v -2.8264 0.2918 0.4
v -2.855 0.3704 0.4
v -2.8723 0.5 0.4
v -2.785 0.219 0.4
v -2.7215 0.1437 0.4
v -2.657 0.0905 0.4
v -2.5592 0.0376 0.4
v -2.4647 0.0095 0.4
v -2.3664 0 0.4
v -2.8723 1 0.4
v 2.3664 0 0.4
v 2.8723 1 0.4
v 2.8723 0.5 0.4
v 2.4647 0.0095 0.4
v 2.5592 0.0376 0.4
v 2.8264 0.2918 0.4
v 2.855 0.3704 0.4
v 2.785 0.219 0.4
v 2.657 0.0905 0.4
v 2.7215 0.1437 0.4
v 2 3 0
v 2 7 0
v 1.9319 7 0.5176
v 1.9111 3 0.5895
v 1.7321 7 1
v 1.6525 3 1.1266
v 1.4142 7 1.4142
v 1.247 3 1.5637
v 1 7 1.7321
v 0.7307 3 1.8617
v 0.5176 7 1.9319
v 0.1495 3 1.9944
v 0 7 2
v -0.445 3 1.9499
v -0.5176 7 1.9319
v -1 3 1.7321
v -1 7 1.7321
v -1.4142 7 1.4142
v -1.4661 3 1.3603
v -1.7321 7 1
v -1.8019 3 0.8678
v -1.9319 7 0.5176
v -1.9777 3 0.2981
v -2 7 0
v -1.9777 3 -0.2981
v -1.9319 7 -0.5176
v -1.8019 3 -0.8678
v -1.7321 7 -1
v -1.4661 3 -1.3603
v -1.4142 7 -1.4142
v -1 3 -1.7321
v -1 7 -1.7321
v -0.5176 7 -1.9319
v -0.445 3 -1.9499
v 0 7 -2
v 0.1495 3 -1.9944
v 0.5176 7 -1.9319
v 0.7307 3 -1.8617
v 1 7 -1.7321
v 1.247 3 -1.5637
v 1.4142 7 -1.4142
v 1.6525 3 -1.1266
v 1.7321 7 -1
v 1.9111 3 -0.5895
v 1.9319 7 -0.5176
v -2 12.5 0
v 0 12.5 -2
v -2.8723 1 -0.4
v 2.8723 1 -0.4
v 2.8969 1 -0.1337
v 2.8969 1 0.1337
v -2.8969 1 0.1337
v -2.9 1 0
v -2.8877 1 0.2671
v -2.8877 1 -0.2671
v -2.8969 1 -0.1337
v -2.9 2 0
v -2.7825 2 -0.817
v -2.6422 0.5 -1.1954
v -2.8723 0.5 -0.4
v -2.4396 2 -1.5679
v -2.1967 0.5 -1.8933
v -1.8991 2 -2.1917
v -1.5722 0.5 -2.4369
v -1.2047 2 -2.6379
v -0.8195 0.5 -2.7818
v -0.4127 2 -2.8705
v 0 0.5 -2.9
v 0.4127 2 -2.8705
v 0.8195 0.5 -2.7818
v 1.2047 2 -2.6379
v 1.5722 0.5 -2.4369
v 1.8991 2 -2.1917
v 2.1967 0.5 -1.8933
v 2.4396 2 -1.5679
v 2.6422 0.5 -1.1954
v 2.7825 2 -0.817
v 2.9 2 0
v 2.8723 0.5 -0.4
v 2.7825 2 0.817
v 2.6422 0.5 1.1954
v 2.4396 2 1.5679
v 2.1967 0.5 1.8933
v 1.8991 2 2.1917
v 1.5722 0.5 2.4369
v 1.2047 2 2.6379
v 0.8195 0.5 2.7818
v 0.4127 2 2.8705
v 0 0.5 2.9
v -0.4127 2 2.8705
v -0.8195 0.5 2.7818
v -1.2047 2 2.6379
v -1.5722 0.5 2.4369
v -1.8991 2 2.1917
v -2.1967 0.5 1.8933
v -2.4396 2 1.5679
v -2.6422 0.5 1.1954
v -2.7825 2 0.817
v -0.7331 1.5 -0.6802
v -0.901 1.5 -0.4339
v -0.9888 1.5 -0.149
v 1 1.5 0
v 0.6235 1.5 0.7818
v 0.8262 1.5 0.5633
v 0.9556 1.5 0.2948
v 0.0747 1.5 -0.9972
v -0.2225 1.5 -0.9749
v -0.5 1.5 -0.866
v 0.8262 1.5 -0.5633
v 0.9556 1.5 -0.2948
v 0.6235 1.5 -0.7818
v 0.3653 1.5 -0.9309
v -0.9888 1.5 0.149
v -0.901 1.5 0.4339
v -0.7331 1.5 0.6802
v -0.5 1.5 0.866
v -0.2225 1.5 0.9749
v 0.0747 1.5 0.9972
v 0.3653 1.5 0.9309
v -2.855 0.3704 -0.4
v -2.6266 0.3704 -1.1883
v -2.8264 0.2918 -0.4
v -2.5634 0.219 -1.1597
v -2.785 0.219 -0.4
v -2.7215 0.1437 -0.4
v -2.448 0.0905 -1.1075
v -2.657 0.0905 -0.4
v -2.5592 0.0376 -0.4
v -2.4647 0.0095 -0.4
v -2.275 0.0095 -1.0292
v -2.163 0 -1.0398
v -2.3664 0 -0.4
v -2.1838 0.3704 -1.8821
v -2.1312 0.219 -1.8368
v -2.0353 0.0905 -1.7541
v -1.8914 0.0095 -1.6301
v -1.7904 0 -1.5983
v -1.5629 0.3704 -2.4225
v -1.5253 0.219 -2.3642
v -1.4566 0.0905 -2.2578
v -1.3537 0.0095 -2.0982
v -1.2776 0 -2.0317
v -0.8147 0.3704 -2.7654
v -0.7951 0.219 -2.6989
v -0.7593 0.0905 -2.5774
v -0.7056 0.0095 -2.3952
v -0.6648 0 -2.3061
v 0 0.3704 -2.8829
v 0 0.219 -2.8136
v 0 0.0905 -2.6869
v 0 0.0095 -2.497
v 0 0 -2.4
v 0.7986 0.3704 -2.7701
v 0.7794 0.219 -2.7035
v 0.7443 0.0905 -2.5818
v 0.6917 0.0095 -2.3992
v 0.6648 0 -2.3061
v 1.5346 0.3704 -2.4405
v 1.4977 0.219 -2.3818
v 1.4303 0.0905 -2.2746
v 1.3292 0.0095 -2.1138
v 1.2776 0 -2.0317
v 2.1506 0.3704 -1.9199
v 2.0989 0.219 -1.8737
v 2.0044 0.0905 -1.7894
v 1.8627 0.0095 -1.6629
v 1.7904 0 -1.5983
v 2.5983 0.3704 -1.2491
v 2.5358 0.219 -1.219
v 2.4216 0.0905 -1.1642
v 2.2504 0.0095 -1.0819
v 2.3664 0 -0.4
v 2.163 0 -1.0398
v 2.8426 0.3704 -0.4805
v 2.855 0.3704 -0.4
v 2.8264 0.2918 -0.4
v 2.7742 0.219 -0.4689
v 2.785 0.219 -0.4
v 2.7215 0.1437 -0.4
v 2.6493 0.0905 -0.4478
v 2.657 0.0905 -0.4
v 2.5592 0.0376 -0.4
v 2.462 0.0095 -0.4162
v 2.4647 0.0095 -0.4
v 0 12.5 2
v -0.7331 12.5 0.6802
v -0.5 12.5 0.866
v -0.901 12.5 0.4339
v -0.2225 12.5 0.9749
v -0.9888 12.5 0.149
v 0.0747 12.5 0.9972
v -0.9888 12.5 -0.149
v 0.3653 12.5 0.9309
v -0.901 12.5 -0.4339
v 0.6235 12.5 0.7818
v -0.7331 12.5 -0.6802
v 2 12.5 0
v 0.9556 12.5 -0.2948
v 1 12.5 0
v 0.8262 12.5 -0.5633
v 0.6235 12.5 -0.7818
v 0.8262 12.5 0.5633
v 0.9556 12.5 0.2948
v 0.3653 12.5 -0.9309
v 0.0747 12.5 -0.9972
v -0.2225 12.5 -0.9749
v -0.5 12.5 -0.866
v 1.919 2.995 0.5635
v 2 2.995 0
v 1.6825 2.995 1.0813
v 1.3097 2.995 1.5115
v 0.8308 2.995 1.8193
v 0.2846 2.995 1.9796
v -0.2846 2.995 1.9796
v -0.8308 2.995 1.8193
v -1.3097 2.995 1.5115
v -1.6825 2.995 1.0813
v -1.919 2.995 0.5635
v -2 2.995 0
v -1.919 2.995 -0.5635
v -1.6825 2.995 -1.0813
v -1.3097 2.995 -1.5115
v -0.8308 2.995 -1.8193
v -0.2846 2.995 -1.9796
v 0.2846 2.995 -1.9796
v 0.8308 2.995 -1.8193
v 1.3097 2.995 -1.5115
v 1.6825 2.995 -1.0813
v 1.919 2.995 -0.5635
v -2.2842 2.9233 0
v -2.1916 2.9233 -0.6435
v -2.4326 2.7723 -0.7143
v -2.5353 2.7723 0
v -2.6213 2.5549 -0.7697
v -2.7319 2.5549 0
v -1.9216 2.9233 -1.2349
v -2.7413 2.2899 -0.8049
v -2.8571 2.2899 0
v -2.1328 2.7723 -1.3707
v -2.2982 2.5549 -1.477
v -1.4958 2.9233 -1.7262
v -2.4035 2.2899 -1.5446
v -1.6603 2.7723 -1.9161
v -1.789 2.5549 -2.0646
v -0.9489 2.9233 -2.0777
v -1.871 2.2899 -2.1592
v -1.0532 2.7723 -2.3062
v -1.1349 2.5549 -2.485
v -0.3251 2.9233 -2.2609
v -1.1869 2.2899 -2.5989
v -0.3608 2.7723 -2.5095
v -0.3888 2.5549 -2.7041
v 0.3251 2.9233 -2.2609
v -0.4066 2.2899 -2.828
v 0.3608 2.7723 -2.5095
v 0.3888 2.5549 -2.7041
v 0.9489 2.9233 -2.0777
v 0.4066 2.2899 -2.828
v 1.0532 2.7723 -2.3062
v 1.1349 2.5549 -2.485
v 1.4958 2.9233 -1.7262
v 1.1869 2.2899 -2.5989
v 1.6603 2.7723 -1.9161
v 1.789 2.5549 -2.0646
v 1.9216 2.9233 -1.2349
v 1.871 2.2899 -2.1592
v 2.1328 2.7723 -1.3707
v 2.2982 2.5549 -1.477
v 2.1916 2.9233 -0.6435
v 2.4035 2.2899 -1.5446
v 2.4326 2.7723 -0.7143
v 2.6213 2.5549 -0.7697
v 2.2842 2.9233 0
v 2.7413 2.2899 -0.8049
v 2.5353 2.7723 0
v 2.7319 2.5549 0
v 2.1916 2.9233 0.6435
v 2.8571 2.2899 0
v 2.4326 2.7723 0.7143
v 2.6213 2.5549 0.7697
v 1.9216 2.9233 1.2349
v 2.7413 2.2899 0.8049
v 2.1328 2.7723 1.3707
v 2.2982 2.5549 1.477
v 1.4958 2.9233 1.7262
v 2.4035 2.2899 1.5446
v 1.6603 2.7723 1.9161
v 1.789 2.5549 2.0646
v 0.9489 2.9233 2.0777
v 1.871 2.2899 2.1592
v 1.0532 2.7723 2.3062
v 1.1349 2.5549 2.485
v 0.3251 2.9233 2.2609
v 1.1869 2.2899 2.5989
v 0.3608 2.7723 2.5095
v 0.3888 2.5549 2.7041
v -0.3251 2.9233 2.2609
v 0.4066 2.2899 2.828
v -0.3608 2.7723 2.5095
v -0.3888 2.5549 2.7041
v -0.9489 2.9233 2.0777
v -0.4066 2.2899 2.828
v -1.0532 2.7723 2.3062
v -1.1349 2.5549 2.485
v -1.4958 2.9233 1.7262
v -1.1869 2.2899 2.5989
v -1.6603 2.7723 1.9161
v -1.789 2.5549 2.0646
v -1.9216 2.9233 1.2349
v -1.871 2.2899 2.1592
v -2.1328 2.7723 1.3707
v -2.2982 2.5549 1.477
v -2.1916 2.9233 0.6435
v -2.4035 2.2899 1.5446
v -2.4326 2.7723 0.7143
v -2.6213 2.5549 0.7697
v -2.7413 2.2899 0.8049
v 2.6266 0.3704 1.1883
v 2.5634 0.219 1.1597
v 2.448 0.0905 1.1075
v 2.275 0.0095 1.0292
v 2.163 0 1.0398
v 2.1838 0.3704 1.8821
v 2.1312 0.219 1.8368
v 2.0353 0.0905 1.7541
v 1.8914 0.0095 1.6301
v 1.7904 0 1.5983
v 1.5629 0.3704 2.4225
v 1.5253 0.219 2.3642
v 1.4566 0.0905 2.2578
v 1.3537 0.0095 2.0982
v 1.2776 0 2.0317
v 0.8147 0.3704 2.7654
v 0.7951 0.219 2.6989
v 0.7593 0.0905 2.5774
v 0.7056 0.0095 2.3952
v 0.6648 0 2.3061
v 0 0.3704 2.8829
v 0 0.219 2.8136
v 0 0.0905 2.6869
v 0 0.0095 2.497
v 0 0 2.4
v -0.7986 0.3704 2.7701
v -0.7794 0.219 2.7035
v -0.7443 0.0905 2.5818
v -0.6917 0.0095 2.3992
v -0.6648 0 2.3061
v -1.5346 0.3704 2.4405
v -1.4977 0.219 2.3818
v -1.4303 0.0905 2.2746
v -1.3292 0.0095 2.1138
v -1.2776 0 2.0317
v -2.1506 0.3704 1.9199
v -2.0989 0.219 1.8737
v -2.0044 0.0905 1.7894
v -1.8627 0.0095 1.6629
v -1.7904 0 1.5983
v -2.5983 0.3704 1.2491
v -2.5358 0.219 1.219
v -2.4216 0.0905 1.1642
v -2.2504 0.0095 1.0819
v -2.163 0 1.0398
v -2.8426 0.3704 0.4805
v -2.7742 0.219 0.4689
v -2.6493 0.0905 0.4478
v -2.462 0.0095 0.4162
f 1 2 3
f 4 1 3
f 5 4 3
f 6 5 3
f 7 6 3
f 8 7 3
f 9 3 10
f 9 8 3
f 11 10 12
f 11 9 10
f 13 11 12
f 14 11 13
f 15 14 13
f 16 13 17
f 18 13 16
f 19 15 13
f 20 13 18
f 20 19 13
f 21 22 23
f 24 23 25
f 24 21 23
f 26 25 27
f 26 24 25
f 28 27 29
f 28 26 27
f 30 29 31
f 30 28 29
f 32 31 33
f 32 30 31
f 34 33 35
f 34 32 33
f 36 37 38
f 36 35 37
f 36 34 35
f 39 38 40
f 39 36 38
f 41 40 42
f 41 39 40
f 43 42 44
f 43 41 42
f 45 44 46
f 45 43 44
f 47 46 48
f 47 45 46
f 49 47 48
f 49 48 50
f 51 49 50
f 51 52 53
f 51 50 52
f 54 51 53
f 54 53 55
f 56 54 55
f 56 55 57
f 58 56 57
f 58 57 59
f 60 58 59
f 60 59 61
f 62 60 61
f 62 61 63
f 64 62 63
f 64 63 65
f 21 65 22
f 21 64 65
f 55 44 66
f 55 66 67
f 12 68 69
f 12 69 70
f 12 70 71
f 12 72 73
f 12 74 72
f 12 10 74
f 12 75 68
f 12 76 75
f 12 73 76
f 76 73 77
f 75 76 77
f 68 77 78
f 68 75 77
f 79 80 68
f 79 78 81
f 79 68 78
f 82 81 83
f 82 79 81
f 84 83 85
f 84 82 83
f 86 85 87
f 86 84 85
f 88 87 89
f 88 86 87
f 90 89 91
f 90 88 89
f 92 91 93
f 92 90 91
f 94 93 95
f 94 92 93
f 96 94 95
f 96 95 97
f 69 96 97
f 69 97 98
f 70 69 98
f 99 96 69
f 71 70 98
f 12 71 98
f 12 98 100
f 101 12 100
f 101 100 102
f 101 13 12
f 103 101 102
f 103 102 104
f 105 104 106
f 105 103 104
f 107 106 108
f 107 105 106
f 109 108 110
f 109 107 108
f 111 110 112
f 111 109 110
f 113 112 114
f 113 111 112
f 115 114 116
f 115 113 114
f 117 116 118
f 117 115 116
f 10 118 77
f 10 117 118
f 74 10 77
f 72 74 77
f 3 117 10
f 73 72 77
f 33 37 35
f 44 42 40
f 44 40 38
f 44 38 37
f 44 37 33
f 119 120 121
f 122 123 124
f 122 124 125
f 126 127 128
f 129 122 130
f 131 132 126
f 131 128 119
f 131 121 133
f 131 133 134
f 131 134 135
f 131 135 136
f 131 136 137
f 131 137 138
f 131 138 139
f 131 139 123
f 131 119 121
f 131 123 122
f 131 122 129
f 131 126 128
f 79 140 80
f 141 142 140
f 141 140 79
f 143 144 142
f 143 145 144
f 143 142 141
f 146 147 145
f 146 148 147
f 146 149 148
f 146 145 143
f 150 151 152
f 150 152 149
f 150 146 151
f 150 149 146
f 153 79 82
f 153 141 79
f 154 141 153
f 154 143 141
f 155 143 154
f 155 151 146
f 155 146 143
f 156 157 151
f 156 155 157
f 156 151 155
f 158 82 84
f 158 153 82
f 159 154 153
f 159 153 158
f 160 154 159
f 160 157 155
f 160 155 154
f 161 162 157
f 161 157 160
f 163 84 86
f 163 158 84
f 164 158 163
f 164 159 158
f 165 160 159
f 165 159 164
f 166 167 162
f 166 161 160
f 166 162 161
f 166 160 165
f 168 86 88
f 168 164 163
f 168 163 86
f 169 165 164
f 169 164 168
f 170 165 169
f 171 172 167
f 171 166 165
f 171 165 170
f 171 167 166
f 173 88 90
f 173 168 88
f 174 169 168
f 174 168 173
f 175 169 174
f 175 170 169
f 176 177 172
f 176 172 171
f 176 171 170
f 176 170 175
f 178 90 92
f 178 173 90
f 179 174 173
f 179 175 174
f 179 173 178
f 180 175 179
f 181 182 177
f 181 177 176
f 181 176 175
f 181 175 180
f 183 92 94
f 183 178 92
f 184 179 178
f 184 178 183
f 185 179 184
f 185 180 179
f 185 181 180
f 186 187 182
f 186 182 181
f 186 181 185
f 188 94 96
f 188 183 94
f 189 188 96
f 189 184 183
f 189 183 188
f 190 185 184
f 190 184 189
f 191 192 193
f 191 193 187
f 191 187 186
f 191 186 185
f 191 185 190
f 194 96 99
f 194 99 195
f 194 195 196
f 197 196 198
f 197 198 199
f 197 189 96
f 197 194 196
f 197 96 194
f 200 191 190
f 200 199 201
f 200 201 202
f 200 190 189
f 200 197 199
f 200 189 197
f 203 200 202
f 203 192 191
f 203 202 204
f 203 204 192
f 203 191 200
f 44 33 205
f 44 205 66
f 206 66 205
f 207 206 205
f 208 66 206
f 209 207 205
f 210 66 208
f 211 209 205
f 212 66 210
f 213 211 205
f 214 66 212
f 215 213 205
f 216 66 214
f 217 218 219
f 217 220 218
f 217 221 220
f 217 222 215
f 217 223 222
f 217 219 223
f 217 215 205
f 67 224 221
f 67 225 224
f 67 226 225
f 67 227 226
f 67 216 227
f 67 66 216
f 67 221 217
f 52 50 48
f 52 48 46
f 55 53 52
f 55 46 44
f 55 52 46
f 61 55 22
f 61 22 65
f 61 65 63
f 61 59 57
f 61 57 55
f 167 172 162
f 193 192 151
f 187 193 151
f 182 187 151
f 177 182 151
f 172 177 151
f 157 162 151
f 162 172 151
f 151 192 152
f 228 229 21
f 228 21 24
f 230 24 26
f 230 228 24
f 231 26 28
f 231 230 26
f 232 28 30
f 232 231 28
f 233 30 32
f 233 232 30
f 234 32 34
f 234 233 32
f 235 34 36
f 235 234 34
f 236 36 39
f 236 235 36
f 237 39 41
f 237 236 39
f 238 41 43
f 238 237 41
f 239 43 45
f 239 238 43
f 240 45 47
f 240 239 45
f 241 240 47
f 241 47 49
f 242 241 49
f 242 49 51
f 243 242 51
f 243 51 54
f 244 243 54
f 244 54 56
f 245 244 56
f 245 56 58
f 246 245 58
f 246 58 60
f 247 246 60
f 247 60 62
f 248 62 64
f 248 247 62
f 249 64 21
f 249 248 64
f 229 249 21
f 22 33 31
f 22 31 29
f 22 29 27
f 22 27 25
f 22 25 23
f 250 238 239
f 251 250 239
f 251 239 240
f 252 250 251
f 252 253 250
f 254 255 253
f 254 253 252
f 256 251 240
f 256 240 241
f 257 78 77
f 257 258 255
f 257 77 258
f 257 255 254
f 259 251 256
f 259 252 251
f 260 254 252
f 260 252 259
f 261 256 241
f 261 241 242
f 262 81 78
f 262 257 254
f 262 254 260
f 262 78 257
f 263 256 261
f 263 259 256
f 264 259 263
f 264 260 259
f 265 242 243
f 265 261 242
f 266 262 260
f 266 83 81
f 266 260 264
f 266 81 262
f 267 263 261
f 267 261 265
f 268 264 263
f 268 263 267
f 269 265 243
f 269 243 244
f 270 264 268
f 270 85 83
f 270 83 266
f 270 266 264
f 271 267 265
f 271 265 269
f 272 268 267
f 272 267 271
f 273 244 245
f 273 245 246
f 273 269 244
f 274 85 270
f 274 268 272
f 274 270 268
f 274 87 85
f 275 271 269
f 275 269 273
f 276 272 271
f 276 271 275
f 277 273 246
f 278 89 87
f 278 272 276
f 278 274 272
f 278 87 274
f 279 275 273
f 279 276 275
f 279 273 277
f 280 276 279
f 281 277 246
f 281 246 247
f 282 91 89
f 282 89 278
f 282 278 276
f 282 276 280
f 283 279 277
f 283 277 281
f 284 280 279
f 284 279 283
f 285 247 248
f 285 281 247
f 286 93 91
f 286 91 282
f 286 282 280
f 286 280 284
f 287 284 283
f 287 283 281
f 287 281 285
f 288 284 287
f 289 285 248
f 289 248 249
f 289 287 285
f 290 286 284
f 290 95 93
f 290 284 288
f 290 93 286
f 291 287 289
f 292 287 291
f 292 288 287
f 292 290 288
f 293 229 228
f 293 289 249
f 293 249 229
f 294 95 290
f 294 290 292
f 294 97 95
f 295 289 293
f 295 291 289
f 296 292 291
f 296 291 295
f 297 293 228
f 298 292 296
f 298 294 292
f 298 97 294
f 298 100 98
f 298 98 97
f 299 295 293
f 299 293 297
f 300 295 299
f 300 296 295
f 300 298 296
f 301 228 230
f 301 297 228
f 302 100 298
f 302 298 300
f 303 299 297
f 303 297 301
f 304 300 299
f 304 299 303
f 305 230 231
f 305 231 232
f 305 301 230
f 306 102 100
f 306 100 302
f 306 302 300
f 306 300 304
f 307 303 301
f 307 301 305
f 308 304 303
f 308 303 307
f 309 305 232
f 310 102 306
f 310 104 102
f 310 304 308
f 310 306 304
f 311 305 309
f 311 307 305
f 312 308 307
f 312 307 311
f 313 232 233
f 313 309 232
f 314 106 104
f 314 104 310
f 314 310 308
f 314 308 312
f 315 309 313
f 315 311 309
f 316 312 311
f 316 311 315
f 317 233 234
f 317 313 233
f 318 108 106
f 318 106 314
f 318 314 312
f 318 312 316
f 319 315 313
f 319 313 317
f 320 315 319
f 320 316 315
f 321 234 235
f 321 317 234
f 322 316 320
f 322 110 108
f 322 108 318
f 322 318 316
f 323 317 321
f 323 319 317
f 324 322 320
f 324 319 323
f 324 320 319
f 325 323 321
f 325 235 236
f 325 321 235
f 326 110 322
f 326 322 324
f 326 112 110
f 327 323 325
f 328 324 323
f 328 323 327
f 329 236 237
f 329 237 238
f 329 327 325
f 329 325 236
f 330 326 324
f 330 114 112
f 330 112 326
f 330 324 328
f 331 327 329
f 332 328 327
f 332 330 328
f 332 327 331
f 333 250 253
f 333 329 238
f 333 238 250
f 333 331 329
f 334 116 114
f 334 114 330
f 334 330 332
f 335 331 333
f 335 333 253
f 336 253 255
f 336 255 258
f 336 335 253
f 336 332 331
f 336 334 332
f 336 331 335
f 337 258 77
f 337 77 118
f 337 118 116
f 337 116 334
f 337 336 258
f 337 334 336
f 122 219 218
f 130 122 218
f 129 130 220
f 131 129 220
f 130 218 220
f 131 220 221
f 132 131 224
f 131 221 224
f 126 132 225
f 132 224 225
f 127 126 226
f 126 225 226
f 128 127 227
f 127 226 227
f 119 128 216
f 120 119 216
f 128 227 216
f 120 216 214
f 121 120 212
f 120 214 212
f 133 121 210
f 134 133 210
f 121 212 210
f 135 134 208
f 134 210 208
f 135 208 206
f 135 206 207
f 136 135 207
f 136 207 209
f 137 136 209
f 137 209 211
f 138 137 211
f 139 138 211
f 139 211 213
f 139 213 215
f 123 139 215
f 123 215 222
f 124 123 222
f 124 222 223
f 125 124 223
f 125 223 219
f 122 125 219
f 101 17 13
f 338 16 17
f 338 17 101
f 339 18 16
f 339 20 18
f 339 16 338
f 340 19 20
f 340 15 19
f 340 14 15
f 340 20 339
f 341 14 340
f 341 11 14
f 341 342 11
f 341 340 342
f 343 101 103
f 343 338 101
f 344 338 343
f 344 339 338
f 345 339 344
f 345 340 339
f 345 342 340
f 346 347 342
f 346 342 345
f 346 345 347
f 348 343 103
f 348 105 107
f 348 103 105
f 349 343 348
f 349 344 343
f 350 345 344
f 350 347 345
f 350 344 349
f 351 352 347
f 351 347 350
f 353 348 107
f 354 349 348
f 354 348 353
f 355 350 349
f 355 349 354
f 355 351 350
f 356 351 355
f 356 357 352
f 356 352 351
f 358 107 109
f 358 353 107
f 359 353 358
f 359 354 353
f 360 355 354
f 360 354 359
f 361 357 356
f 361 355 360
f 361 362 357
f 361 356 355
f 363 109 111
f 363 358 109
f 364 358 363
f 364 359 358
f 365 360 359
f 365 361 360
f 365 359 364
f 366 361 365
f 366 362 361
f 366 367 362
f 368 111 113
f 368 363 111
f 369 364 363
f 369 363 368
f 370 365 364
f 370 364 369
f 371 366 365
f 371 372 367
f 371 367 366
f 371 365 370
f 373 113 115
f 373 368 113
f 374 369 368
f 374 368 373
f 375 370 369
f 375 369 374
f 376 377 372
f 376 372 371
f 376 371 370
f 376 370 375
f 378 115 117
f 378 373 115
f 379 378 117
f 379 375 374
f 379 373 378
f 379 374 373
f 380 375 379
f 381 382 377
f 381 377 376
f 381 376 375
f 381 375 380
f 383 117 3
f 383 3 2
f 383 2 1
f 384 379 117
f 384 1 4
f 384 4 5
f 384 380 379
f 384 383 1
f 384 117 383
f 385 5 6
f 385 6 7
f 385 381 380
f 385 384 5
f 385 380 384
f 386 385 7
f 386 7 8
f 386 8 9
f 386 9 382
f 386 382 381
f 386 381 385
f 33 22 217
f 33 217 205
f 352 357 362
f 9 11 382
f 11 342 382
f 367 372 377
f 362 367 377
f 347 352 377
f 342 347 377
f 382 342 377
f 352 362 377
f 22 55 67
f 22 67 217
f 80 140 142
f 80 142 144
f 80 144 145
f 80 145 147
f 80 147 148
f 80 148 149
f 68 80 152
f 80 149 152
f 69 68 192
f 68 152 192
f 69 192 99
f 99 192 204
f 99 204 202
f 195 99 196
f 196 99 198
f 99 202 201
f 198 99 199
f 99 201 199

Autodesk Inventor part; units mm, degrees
ref_plane "YZ Plane" through (0, 0, 0) normal (1, 0, 0) x (0, 1, 0)
ref_plane "XZ Plane" through (0, 0, 0) normal (0, 1, 0) x (-1, 0, 0)
ref_plane "XY Plane" through (0, 0, 0) normal (0, 0, 1) x (1, 0, 0)
sketch "Sketch1" plane through (0, 0, 0) normal (0, 1, 0) x (-1, 0, 0)
  circle A0 centre (0, 0) radius 2.9
  dimension "d0" = 5.8
extrude "Extrusion1" add sketch "Sketch1" along normal blind 3
sketch "Sketch2" plane through (0, 3, 0) normal (0, 1, 0) x (1, 0, 0)
  circle A0 centre (0, 0) radius 2
  dimension "d3" = 4
extrude "Extrusion2" add sketch "Sketch2" along normal blind 4
sketch "Sketch3" plane through (0, 7, 0) normal (0, 1, 0) x (1, 0, 0)
  circle A0 centre (0, 0) radius 2 projected
  line L0 (0, -2) -> (-2, 0)
  line L1 (-2, 0) -> (0, 2)
  line L2 (0, 2) -> (2, 0)
  line L3 (2, 0) -> (0, -2)
extrude "Extrusion3" add sketch "Sketch3" along normal blind 5.5 contours L3 L0 L1 L2
fillet "Fillet1" radius 1 1 edges at (2.9, 3, 0)
fillet "Fillet2" radius 0.5 1 edges at (2.9, 0, 0)
sketch "Sketch4" plane through (0, 0, 0) normal (0, -1, 0) x (1, 0, 0)
  line L0 (0, 0) -> (-2.9, 0)
  circle A0 centre (0, 0) radius 2.9 projected
  line L1 (0, 0) -> (2.973, 0)
  line L2 (-2.9, 0.4) -> (0, 0.4)
  line L3 (0, 0.4) -> (2.973, 0.4)
  line L4 (-2.9, -0.4) -> (0, -0.4)
  line L5 (0, -0.4) -> (2.973, -0.4)
  circle A1 centre (0, 0) radius 2.9275
  point P0 (2.8723, -0.4)
  point P1 (2.8723, 0.4)
  point P2 (-2.8723, 0.4)
  point P3 (-2.8723, -0.4)
  dimension "d10" = 0.4
  dimension "d11" = 0.4
extrude "Extrusion4" cut sketch "Sketch4" against normal blind 1 contours L1 A0 L5 L4 L0 | L0 A0 L2 L3 L1
sketch "Sketch5" plane through (0, 12.5, 0) normal (0, 1, 0) x (1, 0, 0)
  circle A0 centre (0, 0) radius 1
  dimension "d14" = 2
extrude "Extrusion5" cut sketch "Sketch5" against normal blind 11
properties part number "sroub"
